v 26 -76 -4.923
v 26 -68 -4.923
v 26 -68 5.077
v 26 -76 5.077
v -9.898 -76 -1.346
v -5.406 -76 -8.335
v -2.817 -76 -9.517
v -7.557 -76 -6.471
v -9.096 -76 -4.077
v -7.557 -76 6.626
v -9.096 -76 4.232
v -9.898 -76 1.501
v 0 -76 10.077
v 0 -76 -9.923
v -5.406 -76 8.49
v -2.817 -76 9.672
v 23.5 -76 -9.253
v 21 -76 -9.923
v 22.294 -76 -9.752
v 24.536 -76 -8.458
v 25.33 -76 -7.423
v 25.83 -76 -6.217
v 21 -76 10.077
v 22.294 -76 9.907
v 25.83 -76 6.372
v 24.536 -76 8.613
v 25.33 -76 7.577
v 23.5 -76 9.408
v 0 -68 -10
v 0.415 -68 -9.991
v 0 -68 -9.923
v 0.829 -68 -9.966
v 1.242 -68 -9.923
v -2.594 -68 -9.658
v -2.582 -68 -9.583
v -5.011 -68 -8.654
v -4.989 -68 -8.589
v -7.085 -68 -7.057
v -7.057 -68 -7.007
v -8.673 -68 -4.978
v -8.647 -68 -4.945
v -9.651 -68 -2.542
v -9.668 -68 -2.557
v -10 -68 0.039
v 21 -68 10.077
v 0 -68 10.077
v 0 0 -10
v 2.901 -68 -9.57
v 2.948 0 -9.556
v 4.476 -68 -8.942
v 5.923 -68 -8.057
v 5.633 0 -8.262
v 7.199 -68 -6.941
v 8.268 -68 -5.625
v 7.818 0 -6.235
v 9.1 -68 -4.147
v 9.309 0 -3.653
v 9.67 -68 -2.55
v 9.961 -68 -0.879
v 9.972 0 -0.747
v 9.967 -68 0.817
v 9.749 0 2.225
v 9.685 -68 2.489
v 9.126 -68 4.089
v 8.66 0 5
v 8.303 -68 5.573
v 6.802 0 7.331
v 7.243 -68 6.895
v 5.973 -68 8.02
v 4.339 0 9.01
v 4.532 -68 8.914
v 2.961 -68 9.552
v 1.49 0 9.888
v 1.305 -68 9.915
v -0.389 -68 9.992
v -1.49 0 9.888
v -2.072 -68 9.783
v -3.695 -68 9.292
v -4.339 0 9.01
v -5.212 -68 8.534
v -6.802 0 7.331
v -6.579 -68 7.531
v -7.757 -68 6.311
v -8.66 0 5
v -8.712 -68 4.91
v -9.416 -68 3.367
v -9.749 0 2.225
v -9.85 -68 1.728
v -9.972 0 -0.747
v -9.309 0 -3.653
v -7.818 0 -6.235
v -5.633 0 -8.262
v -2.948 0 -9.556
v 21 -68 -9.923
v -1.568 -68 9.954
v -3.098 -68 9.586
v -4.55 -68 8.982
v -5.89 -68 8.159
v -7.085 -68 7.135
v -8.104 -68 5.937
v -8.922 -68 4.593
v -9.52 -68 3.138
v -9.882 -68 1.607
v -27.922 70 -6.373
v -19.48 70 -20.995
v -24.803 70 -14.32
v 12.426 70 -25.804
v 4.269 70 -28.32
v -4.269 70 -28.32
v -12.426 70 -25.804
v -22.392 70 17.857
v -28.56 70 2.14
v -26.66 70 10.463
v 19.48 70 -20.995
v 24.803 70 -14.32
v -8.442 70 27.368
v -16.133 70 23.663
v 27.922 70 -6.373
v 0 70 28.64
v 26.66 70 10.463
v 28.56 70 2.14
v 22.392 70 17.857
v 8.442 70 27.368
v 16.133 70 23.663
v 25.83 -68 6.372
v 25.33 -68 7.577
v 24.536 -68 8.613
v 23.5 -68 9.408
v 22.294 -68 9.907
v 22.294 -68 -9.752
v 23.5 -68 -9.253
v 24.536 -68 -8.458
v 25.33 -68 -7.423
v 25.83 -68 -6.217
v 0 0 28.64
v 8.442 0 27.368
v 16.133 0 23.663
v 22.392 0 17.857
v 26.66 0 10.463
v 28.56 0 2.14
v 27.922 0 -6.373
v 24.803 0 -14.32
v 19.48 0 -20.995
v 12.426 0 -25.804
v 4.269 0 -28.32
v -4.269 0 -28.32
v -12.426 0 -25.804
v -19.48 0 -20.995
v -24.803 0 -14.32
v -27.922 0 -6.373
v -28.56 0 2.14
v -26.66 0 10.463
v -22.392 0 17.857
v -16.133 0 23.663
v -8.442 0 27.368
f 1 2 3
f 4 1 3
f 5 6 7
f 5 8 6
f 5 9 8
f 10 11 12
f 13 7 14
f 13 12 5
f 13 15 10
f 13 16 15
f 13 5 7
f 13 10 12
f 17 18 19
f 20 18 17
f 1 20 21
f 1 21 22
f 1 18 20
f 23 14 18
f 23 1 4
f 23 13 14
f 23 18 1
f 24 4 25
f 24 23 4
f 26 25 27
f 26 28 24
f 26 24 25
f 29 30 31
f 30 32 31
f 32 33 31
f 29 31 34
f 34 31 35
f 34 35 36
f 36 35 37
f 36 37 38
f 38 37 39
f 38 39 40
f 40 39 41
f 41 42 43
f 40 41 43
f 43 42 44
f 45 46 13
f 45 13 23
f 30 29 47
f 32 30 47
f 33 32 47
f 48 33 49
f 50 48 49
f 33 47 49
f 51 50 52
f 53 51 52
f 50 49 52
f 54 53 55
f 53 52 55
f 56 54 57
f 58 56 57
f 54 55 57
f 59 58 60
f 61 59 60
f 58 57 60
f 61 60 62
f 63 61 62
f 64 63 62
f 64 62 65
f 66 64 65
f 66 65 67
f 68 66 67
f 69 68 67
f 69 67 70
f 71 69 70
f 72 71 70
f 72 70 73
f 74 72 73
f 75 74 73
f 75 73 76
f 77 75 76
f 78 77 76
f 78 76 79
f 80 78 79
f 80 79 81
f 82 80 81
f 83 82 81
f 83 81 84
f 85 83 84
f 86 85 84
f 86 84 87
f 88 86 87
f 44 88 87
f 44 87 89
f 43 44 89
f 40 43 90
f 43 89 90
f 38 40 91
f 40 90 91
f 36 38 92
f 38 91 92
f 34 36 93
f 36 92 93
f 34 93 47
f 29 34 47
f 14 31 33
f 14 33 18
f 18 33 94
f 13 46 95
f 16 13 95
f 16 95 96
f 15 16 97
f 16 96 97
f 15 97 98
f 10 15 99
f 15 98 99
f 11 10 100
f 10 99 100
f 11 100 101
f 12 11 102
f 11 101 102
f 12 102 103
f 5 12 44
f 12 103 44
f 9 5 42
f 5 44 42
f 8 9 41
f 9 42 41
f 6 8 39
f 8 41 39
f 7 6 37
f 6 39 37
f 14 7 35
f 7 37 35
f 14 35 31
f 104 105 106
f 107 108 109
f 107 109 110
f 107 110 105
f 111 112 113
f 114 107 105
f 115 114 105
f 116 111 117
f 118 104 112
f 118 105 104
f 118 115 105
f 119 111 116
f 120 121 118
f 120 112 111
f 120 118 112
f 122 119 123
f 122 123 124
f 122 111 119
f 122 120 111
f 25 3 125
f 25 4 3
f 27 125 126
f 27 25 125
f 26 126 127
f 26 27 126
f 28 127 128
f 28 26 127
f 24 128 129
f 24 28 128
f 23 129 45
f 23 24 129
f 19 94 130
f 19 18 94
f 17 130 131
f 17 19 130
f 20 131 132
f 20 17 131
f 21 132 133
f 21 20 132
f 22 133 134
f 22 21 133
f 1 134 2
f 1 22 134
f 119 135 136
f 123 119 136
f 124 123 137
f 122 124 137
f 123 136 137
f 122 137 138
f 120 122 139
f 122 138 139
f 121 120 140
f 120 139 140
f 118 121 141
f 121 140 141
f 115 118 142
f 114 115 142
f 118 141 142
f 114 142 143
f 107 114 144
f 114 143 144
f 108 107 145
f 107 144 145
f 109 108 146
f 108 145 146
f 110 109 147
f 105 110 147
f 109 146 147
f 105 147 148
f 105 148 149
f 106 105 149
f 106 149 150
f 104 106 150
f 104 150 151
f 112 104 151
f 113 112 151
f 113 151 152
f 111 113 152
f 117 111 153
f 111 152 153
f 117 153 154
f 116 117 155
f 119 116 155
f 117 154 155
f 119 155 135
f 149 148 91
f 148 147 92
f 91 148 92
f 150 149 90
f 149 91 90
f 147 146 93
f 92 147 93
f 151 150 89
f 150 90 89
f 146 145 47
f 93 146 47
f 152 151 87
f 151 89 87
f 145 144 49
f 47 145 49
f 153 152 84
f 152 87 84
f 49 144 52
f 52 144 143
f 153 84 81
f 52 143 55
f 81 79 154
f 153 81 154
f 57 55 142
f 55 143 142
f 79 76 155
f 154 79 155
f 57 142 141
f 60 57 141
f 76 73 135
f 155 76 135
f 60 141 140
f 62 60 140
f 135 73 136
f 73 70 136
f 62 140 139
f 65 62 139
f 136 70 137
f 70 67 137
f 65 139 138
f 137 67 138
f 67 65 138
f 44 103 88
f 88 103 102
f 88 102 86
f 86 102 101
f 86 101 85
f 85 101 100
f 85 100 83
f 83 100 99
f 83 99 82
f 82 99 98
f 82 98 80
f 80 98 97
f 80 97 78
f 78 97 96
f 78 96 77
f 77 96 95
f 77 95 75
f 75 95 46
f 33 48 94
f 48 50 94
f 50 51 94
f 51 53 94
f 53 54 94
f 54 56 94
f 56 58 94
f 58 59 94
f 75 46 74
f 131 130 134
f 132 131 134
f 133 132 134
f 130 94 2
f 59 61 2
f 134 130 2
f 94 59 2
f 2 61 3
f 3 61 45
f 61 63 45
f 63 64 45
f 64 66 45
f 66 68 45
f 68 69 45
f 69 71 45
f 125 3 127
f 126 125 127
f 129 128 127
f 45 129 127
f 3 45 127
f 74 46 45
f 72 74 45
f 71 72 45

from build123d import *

# Parameters (mm, degrees)
SKETCH2_R           = 28.64
BOSS_EXTRUDE1_DEPTH = 70
SKETCH3_R           = 10
BOSS_EXTRUDE2_DEPTH = 68
SKETCH7_W           = 36
SKETCH7_H           = 20
BOSS_EXTRUDE3_DEPTH = 8
FILLET1_R           = 10
FILLET2_R           = 5


with BuildPart() as part:
    # Sketch2 → Boss-Extrude1 (new body)
    with BuildSketch(Plane(origin=(0, 0, 0), x_dir=(1, 0, 0), z_dir=(0, 1, 0))):
        with Locations(Location((0, 0, 0), (0, 0, 270))):
            Circle(SKETCH2_R)
    extrude(amount=BOSS_EXTRUDE1_DEPTH)

    # Sketch3 → Boss-Extrude2 (add)
    with BuildSketch(Plane.XZ):
        with Locations(Location((0, 0, 0), (0, 0, 270))):
            Circle(SKETCH3_R)
    extrude(amount=BOSS_EXTRUDE2_DEPTH)

    # Sketch7 → Boss-Extrude3 (add)
    with BuildSketch(Plane.XZ.offset(68)):
        with Locations((8, 0.077466393)):
            Rectangle(SKETCH7_W, SKETCH7_H)
    extrude(amount=BOSS_EXTRUDE3_DEPTH)

    # Fillet1
    # the kernel refuses this fillet: 10 mm, written as the material it takes off along each edge
    with BuildSketch(Plane(origin=(-10, -68, -9.922533607), x_dir=(1, 0, 0), z_dir=(0, -1, 0))) as fillet1_piece_1:
        with BuildLine():
            CenterArc((FILLET1_R, FILLET1_R), FILLET1_R, 180, 90)
            Line((0, FILLET1_R), (0, 0))
            Line((0, 0), (FILLET1_R, 0))
        make_face()
    extrude(amount=33, mode=Mode.SUBTRACT)
    with BuildSketch(Plane(origin=(-10, -43, 10.077466393), x_dir=(0, 0, -1), z_dir=(0, -1, 0))) as fillet1_piece_2:
        with BuildLine():
            CenterArc((FILLET1_R, FILLET1_R), FILLET1_R, 180, 90)
            Line((0, FILLET1_R), (0, 0))
            Line((0, 0), (FILLET1_R, 0))
        make_face()
    extrude(amount=58, mode=Mode.SUBTRACT)

    # Fillet2
    fillet2_edges = [part.edges().sort_by_distance(p)[0] for p in [
        (26, -72, -9.922533607),
        (26, -72, 10.077466393),
    ]]
    fillet(fillet2_edges, radius=FILLET2_R)


solid = part.part
